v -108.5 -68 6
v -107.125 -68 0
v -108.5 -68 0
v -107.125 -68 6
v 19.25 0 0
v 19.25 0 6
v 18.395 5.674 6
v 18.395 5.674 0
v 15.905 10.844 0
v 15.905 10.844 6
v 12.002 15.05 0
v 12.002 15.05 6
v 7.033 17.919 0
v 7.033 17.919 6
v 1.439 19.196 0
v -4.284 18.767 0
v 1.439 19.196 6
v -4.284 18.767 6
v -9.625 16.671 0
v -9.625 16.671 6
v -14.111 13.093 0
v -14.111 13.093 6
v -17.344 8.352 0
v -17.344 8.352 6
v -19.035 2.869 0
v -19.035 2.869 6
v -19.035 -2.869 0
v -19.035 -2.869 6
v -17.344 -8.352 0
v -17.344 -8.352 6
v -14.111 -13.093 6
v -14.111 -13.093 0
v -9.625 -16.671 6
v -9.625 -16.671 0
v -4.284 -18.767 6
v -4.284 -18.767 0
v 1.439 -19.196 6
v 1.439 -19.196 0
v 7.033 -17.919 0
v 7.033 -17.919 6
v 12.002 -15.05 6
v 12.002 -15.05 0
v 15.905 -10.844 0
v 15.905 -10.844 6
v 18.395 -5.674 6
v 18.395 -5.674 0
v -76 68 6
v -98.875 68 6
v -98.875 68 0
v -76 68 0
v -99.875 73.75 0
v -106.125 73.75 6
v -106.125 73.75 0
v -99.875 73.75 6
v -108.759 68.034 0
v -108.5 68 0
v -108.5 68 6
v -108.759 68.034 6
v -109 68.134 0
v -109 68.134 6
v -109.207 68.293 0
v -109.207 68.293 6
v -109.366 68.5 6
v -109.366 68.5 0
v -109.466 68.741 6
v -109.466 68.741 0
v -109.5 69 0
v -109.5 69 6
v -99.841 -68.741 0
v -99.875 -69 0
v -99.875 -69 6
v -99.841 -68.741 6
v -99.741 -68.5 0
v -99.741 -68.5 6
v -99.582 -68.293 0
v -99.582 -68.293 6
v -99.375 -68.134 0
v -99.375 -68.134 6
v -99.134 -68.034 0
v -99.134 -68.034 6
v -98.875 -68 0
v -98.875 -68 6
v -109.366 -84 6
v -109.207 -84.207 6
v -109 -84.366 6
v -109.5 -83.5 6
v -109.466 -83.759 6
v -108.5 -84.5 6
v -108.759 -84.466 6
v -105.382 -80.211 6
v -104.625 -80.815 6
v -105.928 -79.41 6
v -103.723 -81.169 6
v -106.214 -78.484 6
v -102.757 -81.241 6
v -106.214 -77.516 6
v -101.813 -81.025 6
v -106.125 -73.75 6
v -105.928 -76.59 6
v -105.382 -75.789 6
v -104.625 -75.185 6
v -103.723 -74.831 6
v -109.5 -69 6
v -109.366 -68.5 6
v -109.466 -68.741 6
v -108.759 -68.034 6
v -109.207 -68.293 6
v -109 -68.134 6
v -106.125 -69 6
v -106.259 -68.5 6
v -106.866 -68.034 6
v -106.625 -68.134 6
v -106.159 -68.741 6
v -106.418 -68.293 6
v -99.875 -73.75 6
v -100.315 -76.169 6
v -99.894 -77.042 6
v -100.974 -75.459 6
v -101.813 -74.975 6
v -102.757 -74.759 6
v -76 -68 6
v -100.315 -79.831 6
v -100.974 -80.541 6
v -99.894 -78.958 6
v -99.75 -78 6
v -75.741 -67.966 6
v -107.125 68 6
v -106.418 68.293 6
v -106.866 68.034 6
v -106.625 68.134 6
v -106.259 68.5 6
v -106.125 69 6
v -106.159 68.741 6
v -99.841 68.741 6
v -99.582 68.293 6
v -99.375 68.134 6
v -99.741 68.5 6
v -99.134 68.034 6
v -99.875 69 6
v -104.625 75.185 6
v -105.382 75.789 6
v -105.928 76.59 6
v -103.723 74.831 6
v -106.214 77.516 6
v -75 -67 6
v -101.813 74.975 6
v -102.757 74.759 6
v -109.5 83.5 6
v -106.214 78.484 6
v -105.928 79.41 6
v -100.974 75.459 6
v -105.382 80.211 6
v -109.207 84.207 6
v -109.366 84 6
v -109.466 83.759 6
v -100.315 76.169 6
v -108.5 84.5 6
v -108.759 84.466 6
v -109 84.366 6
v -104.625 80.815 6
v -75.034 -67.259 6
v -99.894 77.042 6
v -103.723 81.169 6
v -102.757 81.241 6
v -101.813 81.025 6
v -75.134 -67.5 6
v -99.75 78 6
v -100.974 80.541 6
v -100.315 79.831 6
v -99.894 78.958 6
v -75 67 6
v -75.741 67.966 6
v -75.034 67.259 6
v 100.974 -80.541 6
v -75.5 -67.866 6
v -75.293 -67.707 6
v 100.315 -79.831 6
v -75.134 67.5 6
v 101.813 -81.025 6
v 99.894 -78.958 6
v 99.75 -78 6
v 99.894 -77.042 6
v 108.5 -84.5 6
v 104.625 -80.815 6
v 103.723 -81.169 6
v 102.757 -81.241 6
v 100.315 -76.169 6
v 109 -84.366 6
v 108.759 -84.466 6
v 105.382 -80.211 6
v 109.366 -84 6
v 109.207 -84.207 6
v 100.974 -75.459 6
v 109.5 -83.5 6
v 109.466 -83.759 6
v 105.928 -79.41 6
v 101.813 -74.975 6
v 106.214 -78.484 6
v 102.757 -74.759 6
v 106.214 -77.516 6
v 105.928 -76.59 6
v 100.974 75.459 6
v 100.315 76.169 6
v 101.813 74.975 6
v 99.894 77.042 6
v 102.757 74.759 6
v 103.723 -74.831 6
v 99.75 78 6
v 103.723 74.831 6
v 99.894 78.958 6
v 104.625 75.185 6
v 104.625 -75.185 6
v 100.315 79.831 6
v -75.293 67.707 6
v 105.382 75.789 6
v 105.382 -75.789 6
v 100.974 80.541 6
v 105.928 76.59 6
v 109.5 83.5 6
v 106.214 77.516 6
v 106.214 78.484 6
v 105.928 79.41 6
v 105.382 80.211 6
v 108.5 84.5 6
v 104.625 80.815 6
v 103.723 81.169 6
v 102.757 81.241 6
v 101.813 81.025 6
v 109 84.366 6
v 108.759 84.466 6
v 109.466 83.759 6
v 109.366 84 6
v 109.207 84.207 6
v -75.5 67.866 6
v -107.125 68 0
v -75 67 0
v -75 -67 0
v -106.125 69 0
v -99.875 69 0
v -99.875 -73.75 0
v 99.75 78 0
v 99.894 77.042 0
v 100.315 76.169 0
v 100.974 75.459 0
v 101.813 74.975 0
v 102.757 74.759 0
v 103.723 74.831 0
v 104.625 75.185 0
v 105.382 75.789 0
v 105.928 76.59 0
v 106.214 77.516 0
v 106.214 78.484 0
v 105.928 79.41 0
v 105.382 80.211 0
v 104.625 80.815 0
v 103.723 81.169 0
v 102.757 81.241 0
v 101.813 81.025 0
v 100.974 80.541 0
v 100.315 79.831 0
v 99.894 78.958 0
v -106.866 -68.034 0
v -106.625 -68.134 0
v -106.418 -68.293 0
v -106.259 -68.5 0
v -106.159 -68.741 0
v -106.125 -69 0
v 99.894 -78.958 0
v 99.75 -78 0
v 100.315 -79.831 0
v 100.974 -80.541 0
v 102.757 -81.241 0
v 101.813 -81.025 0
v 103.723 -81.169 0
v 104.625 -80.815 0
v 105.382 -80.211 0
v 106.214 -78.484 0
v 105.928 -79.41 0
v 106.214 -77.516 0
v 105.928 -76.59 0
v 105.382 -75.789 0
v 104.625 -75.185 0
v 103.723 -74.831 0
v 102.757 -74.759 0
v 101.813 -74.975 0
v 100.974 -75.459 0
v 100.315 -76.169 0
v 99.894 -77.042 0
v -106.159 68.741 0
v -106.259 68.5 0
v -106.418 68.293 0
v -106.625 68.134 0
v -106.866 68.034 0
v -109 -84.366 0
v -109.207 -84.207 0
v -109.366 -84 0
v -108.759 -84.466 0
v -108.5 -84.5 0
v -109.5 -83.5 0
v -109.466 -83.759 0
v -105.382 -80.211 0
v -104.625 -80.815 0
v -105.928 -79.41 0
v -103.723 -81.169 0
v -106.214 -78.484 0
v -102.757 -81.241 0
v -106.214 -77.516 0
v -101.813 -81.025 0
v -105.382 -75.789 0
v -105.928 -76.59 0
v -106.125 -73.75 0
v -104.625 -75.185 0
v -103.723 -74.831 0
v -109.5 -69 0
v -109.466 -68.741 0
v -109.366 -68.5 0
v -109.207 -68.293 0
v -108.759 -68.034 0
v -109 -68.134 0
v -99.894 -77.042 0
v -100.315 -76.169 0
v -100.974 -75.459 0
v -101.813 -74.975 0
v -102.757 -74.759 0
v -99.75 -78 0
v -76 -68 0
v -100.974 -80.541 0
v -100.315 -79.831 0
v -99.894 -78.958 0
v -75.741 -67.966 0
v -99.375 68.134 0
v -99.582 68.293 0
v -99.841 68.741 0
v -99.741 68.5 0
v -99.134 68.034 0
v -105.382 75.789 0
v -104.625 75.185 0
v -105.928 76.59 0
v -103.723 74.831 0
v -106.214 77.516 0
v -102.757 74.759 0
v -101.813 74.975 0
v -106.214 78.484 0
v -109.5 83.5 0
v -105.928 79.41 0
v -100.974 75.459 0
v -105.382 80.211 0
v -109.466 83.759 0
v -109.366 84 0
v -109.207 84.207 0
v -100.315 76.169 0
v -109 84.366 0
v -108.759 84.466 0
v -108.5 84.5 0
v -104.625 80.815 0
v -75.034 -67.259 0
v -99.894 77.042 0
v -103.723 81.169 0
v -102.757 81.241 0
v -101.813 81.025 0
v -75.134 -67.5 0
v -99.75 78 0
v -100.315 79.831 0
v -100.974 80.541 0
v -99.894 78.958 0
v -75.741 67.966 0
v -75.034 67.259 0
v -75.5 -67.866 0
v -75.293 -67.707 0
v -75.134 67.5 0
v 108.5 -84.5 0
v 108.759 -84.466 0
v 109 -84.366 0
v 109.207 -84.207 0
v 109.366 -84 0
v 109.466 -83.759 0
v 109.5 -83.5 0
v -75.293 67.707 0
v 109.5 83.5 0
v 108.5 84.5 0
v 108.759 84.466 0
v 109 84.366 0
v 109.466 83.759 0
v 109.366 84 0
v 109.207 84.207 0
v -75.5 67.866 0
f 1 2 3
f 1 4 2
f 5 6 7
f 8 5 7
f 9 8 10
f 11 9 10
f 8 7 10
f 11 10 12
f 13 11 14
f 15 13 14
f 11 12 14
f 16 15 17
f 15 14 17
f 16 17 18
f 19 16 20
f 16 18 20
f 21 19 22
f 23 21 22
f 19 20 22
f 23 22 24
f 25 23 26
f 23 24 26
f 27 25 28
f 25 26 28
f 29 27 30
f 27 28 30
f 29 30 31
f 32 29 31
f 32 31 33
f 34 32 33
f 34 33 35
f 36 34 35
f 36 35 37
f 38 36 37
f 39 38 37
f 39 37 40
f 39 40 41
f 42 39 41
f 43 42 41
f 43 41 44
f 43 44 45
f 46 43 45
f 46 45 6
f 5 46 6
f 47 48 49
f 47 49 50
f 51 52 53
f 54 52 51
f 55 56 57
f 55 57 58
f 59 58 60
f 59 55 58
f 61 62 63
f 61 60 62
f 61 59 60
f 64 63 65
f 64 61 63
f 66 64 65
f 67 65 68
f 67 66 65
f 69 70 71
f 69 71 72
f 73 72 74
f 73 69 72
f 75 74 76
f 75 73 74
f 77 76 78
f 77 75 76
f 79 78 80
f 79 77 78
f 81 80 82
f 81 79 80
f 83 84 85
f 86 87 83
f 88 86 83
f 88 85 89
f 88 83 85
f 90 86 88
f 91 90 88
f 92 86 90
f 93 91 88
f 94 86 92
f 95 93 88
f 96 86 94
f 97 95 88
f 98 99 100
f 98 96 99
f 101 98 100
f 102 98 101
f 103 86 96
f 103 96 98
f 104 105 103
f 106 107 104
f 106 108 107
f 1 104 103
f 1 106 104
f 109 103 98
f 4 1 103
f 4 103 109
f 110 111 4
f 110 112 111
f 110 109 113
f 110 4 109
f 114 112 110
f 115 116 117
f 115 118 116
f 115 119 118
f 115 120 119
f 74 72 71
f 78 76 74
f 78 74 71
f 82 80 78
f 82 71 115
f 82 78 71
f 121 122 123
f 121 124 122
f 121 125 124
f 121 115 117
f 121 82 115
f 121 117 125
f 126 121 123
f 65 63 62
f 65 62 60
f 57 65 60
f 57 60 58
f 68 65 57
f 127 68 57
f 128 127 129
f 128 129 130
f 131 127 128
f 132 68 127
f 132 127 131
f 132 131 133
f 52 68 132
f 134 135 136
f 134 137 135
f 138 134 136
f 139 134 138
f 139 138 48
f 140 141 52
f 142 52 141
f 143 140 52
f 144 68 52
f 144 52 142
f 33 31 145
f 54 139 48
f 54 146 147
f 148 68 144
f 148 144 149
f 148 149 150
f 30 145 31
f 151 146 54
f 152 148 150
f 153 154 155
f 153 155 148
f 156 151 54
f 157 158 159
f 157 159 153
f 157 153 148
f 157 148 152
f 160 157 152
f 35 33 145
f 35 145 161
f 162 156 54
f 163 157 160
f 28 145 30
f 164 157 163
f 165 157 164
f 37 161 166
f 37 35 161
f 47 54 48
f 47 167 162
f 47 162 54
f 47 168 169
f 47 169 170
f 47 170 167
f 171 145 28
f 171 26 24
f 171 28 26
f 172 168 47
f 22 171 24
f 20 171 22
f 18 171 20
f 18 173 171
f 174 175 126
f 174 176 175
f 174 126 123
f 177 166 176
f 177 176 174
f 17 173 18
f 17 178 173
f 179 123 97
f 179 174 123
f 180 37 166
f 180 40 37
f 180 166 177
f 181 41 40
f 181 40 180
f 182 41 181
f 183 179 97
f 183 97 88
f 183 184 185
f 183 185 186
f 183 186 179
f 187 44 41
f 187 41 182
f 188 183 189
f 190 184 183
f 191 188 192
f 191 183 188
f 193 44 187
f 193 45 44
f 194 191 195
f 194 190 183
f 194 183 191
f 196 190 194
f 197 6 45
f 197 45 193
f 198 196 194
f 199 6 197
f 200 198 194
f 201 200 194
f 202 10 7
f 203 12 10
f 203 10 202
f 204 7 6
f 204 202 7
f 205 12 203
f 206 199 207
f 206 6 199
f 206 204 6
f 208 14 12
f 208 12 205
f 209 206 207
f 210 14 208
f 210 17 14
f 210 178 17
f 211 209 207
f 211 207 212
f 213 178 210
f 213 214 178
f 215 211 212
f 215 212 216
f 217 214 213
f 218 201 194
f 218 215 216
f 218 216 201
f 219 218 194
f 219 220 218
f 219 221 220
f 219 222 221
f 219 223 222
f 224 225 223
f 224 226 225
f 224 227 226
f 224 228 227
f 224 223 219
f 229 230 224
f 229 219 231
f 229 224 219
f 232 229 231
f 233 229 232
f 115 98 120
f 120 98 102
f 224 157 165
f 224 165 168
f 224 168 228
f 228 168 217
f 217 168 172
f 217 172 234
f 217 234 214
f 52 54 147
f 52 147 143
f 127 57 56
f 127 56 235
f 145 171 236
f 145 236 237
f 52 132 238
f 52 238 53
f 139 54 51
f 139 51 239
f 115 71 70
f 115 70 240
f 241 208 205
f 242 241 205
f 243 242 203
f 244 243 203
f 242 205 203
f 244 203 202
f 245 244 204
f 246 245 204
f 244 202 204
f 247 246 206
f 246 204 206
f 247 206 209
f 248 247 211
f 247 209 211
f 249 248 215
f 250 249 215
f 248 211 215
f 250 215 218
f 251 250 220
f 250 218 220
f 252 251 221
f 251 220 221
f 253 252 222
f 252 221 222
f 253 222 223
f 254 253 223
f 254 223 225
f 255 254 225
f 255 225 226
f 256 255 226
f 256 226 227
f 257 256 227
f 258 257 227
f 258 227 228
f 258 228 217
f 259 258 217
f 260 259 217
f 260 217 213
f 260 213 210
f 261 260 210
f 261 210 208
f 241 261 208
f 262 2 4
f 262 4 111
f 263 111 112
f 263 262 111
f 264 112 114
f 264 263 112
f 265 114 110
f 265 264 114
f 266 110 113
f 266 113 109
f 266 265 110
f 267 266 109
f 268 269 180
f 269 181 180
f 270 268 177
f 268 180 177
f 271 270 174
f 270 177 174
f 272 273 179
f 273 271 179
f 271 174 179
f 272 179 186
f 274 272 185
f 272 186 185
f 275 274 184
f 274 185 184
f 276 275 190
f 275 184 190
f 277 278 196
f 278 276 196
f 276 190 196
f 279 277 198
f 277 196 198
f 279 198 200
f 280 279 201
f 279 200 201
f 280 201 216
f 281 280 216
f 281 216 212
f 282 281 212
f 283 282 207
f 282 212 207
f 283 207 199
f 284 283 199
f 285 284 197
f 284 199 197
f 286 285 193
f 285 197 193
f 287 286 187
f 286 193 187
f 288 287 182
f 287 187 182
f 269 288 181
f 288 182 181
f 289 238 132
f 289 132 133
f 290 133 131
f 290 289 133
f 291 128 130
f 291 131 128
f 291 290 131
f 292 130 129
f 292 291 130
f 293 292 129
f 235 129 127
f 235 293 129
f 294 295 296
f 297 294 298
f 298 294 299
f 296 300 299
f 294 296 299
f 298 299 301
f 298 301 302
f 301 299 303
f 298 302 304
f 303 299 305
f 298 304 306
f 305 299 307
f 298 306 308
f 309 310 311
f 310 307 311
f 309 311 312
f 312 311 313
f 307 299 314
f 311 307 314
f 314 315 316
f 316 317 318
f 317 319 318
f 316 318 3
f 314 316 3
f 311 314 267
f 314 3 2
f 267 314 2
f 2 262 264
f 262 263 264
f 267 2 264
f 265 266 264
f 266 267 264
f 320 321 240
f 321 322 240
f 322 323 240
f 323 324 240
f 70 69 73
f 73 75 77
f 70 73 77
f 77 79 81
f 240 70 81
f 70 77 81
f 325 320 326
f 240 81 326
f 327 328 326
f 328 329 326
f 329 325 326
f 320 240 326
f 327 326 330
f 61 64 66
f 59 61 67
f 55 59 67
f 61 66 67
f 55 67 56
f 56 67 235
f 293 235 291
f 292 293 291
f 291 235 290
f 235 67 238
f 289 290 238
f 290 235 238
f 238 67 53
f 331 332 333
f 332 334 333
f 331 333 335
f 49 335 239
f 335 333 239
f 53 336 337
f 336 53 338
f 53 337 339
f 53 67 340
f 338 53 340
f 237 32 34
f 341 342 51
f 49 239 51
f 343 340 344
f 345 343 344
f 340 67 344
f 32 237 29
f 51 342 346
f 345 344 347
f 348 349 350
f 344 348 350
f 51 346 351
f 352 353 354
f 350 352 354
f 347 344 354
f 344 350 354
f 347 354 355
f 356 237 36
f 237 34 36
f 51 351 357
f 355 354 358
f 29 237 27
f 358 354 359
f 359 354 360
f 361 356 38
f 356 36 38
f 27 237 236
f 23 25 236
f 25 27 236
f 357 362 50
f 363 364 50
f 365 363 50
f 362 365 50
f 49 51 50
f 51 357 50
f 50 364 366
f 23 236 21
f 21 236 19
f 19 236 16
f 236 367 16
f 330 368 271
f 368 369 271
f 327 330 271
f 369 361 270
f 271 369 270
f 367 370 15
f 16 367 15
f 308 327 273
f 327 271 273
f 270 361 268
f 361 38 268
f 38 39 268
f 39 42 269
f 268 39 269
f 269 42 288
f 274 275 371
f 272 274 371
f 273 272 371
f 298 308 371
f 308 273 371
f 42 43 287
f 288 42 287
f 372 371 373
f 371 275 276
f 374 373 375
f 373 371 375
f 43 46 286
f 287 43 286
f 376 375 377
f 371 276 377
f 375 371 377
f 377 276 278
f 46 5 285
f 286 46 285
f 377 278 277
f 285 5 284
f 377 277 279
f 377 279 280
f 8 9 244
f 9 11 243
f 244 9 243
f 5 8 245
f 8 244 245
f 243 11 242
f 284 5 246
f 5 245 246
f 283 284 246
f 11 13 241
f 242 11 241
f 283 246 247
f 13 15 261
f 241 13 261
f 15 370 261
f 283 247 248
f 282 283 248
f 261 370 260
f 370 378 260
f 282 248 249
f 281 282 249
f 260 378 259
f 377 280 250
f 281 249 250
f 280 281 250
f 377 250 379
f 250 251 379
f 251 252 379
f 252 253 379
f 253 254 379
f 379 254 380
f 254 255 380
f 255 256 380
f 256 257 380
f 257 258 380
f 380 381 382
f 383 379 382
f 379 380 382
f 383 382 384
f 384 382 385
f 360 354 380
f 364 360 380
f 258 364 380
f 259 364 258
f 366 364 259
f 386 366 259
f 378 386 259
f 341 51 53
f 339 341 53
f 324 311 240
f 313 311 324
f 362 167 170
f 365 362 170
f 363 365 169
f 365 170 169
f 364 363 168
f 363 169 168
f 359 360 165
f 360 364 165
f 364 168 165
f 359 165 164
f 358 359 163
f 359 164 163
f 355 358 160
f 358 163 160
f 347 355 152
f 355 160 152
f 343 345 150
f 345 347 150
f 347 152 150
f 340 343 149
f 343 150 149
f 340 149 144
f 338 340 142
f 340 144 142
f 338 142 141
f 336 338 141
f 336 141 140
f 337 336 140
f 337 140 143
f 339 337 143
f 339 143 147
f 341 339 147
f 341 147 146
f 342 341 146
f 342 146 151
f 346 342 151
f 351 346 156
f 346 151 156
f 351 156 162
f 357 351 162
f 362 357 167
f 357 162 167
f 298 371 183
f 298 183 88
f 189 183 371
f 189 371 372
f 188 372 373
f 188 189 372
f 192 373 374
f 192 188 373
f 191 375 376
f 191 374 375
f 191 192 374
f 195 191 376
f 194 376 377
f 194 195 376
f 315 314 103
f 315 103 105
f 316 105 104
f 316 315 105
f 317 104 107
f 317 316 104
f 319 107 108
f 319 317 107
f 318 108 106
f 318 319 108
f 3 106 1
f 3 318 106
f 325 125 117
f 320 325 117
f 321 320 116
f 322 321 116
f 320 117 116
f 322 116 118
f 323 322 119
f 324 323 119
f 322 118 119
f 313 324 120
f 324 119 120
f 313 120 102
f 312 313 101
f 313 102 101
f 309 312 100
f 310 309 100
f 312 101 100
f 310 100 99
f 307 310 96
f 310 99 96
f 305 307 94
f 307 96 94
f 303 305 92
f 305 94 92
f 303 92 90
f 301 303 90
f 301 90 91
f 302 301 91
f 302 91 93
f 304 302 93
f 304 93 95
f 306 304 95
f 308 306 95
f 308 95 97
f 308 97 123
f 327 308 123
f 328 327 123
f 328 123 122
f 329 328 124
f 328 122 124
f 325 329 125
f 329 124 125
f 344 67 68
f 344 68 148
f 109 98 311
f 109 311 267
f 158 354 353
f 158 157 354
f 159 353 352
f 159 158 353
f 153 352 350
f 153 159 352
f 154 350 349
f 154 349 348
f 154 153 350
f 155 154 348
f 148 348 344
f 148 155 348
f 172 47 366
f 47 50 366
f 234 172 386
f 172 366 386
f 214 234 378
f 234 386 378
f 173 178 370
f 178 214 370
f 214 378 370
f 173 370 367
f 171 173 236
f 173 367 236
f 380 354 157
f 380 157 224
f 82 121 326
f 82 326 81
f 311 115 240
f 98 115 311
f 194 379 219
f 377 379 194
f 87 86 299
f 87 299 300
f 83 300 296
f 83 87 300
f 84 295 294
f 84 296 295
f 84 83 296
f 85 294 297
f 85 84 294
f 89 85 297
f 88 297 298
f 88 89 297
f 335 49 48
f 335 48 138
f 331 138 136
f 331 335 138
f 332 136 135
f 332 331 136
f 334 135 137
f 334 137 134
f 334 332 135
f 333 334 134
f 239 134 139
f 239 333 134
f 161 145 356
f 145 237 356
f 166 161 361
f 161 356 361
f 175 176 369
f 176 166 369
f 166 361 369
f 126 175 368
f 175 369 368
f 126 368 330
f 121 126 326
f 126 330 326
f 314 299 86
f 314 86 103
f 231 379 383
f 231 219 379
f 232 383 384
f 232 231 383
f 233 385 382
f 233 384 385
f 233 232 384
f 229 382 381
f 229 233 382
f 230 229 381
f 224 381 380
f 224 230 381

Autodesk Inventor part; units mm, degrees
sketch "Sketch1" plane through (0, 0, 0) normal (0, 0, 1) x (1, 0, 0)
  line L0 (-109.5, 84.5) -> (109.5, 84.5)
  line L1 (109.5, 84.5) -> (109.5, -84.5)
  line L2 (109.5, -84.5) -> (-109.5, -84.5)
  line L3 (-109.5, -84.5) -> (-109.5, 84.5)
  point P0 (0, 84.5)
  point P1 (0, 0)
  point P2 (-109.5, 0)
  dimension "d0" = 219
  dimension "d1" = 169
extrude "Extrusion1" add sketch "Sketch1" along normal blind 6
sketch "Sketch2" plane through (0, 0, 6) normal (0, 0, 1) x (1, 0, 0)
  line L0 (-103, -84.5) -> (-103, -78) construction
  circle A0 centre (-103, -78) radius 3.25
  line L1 (-103, -78) -> (-103, -74) construction
  line L2 (-106.25, -68) -> (-99.75, -68)
  line L3 (-99.75, -68) -> (-99.75, -74)
  line L4 (-99.75, -74) -> (-106.25, -74)
  line L5 (-106.25, -74) -> (-106.25, -68)
  line L6 (-109.5, -84.5) -> (-103, -84.5) construction
  point P0 (0, 0)
  dimension "d38" = 6.5
  dimension "d39" = 6.5
  dimension "d44" = 4
  dimension "d45" = 6.5
  dimension "d46" = 6
  dimension "d58" = 6.5
extrude "Extrusion2" cut sketch "Sketch2" against normal blind 6 contours A0
mirror "Mirror3" about plane through (0, 0, 0) normal (1, 0, 0) of "Extrusion2"
mirror "Mirror7" about plane through (0, 0, 0) normal (0, 1, 0) of "Extrusion2", "Mirror3"
sketch "Sketch7" plane through (0, 0, 6) normal (0, 0, 1) x (1, 0, 0)
  line L0 (-109.5, 84.5) -> (-109.5, -84.5) projected
  line L1 (-109.5, 68) -> (-75, 68)
  line L2 (-75, 68) -> (-75, -68)
  line L3 (-75, -68) -> (-109.5, -68)
  line L4 (-109.5, -68) -> (-109.5, 68)
  point P0 (0, 0)
  point P1 (-109.5, 0)
  point P2 (-109.5, 0)
  dimension "d40" = 34.5
  dimension "d41" = 136
extrude "Extrusion6" cut sketch "Sketch7" against normal blind 10
sketch "Sketch8" plane through (0, 0, 6) normal (0, 0, 1) x (1, 0, 0)
  circle A0 centre (-103, -78) radius 3.25 projected
  line L0 (-103, -78) -> (-103, -73.75) construction
  line L1 (-106.125, -68) -> (-99.875, -68)
  line L2 (-99.875, -68) -> (-99.875, -73.75)
  line L3 (-99.875, -73.75) -> (-106.125, -73.75)
  line L4 (-106.125, -73.75) -> (-106.125, -68)
  point P0 (0, 0)
  dimension "d47" = 4.25
  dimension "d48" = 6.25
  dimension "d49" = 5.75
extrude "Extrusion7" cut sketch "Sketch8" against normal blind 6 contours L1 L2 L3 L4
mirror "Mirror8" about plane through (0, 0, 0) normal (0, 1, 0) of "Extrusion7"
fillet "Fillet5" radius 1 12 edges at (-109.5, -84.5, 3) (109.5, -84.5, 3) (-75, -68, 3) (109.5, 84.5, 3) (-109.5, 84.5, 3) (-109.5, 68, 3) (-75, 68, 3) (-99.875, 68, 3) (-106.125, 68, 3) (-99.875, -68, 3) (-109.5, -68, 3) (-106.125, -68, 3)
sketch "Sketch9" plane through (0, 0, 6) normal (0, 0, 1) x (1, 0, 0)
  line L0 (-75, 44.5) -> (39, 44.5) construction
  line L1 (39, 44.5) -> (39, -44.5) construction
  line L2 (39, -44.5) -> (-75, -44.5) construction
  line L3 (-75, -44.5) -> (-75, 44.5) construction
  line L4 (-75, 67) -> (-75, -67) projected
  line L5 (39, 44.5) -> (-75, -44.5) construction
  circle A0 centre (0, 0) radius 19.25
  point P0 (-75, 0)
  point P1 (-75, 0)
  point P2 (-75, 0)
  dimension "d53" = 114
  dimension "d54" = 89
  dimension "d55" = 38.5
extrude "Extrusion8" cut sketch "Sketch9" against normal through all
equation "\"d7\" = d46"
properties part number "MDF_Top_Big_Mic" material "MDF Medium Density Fiberboard"
